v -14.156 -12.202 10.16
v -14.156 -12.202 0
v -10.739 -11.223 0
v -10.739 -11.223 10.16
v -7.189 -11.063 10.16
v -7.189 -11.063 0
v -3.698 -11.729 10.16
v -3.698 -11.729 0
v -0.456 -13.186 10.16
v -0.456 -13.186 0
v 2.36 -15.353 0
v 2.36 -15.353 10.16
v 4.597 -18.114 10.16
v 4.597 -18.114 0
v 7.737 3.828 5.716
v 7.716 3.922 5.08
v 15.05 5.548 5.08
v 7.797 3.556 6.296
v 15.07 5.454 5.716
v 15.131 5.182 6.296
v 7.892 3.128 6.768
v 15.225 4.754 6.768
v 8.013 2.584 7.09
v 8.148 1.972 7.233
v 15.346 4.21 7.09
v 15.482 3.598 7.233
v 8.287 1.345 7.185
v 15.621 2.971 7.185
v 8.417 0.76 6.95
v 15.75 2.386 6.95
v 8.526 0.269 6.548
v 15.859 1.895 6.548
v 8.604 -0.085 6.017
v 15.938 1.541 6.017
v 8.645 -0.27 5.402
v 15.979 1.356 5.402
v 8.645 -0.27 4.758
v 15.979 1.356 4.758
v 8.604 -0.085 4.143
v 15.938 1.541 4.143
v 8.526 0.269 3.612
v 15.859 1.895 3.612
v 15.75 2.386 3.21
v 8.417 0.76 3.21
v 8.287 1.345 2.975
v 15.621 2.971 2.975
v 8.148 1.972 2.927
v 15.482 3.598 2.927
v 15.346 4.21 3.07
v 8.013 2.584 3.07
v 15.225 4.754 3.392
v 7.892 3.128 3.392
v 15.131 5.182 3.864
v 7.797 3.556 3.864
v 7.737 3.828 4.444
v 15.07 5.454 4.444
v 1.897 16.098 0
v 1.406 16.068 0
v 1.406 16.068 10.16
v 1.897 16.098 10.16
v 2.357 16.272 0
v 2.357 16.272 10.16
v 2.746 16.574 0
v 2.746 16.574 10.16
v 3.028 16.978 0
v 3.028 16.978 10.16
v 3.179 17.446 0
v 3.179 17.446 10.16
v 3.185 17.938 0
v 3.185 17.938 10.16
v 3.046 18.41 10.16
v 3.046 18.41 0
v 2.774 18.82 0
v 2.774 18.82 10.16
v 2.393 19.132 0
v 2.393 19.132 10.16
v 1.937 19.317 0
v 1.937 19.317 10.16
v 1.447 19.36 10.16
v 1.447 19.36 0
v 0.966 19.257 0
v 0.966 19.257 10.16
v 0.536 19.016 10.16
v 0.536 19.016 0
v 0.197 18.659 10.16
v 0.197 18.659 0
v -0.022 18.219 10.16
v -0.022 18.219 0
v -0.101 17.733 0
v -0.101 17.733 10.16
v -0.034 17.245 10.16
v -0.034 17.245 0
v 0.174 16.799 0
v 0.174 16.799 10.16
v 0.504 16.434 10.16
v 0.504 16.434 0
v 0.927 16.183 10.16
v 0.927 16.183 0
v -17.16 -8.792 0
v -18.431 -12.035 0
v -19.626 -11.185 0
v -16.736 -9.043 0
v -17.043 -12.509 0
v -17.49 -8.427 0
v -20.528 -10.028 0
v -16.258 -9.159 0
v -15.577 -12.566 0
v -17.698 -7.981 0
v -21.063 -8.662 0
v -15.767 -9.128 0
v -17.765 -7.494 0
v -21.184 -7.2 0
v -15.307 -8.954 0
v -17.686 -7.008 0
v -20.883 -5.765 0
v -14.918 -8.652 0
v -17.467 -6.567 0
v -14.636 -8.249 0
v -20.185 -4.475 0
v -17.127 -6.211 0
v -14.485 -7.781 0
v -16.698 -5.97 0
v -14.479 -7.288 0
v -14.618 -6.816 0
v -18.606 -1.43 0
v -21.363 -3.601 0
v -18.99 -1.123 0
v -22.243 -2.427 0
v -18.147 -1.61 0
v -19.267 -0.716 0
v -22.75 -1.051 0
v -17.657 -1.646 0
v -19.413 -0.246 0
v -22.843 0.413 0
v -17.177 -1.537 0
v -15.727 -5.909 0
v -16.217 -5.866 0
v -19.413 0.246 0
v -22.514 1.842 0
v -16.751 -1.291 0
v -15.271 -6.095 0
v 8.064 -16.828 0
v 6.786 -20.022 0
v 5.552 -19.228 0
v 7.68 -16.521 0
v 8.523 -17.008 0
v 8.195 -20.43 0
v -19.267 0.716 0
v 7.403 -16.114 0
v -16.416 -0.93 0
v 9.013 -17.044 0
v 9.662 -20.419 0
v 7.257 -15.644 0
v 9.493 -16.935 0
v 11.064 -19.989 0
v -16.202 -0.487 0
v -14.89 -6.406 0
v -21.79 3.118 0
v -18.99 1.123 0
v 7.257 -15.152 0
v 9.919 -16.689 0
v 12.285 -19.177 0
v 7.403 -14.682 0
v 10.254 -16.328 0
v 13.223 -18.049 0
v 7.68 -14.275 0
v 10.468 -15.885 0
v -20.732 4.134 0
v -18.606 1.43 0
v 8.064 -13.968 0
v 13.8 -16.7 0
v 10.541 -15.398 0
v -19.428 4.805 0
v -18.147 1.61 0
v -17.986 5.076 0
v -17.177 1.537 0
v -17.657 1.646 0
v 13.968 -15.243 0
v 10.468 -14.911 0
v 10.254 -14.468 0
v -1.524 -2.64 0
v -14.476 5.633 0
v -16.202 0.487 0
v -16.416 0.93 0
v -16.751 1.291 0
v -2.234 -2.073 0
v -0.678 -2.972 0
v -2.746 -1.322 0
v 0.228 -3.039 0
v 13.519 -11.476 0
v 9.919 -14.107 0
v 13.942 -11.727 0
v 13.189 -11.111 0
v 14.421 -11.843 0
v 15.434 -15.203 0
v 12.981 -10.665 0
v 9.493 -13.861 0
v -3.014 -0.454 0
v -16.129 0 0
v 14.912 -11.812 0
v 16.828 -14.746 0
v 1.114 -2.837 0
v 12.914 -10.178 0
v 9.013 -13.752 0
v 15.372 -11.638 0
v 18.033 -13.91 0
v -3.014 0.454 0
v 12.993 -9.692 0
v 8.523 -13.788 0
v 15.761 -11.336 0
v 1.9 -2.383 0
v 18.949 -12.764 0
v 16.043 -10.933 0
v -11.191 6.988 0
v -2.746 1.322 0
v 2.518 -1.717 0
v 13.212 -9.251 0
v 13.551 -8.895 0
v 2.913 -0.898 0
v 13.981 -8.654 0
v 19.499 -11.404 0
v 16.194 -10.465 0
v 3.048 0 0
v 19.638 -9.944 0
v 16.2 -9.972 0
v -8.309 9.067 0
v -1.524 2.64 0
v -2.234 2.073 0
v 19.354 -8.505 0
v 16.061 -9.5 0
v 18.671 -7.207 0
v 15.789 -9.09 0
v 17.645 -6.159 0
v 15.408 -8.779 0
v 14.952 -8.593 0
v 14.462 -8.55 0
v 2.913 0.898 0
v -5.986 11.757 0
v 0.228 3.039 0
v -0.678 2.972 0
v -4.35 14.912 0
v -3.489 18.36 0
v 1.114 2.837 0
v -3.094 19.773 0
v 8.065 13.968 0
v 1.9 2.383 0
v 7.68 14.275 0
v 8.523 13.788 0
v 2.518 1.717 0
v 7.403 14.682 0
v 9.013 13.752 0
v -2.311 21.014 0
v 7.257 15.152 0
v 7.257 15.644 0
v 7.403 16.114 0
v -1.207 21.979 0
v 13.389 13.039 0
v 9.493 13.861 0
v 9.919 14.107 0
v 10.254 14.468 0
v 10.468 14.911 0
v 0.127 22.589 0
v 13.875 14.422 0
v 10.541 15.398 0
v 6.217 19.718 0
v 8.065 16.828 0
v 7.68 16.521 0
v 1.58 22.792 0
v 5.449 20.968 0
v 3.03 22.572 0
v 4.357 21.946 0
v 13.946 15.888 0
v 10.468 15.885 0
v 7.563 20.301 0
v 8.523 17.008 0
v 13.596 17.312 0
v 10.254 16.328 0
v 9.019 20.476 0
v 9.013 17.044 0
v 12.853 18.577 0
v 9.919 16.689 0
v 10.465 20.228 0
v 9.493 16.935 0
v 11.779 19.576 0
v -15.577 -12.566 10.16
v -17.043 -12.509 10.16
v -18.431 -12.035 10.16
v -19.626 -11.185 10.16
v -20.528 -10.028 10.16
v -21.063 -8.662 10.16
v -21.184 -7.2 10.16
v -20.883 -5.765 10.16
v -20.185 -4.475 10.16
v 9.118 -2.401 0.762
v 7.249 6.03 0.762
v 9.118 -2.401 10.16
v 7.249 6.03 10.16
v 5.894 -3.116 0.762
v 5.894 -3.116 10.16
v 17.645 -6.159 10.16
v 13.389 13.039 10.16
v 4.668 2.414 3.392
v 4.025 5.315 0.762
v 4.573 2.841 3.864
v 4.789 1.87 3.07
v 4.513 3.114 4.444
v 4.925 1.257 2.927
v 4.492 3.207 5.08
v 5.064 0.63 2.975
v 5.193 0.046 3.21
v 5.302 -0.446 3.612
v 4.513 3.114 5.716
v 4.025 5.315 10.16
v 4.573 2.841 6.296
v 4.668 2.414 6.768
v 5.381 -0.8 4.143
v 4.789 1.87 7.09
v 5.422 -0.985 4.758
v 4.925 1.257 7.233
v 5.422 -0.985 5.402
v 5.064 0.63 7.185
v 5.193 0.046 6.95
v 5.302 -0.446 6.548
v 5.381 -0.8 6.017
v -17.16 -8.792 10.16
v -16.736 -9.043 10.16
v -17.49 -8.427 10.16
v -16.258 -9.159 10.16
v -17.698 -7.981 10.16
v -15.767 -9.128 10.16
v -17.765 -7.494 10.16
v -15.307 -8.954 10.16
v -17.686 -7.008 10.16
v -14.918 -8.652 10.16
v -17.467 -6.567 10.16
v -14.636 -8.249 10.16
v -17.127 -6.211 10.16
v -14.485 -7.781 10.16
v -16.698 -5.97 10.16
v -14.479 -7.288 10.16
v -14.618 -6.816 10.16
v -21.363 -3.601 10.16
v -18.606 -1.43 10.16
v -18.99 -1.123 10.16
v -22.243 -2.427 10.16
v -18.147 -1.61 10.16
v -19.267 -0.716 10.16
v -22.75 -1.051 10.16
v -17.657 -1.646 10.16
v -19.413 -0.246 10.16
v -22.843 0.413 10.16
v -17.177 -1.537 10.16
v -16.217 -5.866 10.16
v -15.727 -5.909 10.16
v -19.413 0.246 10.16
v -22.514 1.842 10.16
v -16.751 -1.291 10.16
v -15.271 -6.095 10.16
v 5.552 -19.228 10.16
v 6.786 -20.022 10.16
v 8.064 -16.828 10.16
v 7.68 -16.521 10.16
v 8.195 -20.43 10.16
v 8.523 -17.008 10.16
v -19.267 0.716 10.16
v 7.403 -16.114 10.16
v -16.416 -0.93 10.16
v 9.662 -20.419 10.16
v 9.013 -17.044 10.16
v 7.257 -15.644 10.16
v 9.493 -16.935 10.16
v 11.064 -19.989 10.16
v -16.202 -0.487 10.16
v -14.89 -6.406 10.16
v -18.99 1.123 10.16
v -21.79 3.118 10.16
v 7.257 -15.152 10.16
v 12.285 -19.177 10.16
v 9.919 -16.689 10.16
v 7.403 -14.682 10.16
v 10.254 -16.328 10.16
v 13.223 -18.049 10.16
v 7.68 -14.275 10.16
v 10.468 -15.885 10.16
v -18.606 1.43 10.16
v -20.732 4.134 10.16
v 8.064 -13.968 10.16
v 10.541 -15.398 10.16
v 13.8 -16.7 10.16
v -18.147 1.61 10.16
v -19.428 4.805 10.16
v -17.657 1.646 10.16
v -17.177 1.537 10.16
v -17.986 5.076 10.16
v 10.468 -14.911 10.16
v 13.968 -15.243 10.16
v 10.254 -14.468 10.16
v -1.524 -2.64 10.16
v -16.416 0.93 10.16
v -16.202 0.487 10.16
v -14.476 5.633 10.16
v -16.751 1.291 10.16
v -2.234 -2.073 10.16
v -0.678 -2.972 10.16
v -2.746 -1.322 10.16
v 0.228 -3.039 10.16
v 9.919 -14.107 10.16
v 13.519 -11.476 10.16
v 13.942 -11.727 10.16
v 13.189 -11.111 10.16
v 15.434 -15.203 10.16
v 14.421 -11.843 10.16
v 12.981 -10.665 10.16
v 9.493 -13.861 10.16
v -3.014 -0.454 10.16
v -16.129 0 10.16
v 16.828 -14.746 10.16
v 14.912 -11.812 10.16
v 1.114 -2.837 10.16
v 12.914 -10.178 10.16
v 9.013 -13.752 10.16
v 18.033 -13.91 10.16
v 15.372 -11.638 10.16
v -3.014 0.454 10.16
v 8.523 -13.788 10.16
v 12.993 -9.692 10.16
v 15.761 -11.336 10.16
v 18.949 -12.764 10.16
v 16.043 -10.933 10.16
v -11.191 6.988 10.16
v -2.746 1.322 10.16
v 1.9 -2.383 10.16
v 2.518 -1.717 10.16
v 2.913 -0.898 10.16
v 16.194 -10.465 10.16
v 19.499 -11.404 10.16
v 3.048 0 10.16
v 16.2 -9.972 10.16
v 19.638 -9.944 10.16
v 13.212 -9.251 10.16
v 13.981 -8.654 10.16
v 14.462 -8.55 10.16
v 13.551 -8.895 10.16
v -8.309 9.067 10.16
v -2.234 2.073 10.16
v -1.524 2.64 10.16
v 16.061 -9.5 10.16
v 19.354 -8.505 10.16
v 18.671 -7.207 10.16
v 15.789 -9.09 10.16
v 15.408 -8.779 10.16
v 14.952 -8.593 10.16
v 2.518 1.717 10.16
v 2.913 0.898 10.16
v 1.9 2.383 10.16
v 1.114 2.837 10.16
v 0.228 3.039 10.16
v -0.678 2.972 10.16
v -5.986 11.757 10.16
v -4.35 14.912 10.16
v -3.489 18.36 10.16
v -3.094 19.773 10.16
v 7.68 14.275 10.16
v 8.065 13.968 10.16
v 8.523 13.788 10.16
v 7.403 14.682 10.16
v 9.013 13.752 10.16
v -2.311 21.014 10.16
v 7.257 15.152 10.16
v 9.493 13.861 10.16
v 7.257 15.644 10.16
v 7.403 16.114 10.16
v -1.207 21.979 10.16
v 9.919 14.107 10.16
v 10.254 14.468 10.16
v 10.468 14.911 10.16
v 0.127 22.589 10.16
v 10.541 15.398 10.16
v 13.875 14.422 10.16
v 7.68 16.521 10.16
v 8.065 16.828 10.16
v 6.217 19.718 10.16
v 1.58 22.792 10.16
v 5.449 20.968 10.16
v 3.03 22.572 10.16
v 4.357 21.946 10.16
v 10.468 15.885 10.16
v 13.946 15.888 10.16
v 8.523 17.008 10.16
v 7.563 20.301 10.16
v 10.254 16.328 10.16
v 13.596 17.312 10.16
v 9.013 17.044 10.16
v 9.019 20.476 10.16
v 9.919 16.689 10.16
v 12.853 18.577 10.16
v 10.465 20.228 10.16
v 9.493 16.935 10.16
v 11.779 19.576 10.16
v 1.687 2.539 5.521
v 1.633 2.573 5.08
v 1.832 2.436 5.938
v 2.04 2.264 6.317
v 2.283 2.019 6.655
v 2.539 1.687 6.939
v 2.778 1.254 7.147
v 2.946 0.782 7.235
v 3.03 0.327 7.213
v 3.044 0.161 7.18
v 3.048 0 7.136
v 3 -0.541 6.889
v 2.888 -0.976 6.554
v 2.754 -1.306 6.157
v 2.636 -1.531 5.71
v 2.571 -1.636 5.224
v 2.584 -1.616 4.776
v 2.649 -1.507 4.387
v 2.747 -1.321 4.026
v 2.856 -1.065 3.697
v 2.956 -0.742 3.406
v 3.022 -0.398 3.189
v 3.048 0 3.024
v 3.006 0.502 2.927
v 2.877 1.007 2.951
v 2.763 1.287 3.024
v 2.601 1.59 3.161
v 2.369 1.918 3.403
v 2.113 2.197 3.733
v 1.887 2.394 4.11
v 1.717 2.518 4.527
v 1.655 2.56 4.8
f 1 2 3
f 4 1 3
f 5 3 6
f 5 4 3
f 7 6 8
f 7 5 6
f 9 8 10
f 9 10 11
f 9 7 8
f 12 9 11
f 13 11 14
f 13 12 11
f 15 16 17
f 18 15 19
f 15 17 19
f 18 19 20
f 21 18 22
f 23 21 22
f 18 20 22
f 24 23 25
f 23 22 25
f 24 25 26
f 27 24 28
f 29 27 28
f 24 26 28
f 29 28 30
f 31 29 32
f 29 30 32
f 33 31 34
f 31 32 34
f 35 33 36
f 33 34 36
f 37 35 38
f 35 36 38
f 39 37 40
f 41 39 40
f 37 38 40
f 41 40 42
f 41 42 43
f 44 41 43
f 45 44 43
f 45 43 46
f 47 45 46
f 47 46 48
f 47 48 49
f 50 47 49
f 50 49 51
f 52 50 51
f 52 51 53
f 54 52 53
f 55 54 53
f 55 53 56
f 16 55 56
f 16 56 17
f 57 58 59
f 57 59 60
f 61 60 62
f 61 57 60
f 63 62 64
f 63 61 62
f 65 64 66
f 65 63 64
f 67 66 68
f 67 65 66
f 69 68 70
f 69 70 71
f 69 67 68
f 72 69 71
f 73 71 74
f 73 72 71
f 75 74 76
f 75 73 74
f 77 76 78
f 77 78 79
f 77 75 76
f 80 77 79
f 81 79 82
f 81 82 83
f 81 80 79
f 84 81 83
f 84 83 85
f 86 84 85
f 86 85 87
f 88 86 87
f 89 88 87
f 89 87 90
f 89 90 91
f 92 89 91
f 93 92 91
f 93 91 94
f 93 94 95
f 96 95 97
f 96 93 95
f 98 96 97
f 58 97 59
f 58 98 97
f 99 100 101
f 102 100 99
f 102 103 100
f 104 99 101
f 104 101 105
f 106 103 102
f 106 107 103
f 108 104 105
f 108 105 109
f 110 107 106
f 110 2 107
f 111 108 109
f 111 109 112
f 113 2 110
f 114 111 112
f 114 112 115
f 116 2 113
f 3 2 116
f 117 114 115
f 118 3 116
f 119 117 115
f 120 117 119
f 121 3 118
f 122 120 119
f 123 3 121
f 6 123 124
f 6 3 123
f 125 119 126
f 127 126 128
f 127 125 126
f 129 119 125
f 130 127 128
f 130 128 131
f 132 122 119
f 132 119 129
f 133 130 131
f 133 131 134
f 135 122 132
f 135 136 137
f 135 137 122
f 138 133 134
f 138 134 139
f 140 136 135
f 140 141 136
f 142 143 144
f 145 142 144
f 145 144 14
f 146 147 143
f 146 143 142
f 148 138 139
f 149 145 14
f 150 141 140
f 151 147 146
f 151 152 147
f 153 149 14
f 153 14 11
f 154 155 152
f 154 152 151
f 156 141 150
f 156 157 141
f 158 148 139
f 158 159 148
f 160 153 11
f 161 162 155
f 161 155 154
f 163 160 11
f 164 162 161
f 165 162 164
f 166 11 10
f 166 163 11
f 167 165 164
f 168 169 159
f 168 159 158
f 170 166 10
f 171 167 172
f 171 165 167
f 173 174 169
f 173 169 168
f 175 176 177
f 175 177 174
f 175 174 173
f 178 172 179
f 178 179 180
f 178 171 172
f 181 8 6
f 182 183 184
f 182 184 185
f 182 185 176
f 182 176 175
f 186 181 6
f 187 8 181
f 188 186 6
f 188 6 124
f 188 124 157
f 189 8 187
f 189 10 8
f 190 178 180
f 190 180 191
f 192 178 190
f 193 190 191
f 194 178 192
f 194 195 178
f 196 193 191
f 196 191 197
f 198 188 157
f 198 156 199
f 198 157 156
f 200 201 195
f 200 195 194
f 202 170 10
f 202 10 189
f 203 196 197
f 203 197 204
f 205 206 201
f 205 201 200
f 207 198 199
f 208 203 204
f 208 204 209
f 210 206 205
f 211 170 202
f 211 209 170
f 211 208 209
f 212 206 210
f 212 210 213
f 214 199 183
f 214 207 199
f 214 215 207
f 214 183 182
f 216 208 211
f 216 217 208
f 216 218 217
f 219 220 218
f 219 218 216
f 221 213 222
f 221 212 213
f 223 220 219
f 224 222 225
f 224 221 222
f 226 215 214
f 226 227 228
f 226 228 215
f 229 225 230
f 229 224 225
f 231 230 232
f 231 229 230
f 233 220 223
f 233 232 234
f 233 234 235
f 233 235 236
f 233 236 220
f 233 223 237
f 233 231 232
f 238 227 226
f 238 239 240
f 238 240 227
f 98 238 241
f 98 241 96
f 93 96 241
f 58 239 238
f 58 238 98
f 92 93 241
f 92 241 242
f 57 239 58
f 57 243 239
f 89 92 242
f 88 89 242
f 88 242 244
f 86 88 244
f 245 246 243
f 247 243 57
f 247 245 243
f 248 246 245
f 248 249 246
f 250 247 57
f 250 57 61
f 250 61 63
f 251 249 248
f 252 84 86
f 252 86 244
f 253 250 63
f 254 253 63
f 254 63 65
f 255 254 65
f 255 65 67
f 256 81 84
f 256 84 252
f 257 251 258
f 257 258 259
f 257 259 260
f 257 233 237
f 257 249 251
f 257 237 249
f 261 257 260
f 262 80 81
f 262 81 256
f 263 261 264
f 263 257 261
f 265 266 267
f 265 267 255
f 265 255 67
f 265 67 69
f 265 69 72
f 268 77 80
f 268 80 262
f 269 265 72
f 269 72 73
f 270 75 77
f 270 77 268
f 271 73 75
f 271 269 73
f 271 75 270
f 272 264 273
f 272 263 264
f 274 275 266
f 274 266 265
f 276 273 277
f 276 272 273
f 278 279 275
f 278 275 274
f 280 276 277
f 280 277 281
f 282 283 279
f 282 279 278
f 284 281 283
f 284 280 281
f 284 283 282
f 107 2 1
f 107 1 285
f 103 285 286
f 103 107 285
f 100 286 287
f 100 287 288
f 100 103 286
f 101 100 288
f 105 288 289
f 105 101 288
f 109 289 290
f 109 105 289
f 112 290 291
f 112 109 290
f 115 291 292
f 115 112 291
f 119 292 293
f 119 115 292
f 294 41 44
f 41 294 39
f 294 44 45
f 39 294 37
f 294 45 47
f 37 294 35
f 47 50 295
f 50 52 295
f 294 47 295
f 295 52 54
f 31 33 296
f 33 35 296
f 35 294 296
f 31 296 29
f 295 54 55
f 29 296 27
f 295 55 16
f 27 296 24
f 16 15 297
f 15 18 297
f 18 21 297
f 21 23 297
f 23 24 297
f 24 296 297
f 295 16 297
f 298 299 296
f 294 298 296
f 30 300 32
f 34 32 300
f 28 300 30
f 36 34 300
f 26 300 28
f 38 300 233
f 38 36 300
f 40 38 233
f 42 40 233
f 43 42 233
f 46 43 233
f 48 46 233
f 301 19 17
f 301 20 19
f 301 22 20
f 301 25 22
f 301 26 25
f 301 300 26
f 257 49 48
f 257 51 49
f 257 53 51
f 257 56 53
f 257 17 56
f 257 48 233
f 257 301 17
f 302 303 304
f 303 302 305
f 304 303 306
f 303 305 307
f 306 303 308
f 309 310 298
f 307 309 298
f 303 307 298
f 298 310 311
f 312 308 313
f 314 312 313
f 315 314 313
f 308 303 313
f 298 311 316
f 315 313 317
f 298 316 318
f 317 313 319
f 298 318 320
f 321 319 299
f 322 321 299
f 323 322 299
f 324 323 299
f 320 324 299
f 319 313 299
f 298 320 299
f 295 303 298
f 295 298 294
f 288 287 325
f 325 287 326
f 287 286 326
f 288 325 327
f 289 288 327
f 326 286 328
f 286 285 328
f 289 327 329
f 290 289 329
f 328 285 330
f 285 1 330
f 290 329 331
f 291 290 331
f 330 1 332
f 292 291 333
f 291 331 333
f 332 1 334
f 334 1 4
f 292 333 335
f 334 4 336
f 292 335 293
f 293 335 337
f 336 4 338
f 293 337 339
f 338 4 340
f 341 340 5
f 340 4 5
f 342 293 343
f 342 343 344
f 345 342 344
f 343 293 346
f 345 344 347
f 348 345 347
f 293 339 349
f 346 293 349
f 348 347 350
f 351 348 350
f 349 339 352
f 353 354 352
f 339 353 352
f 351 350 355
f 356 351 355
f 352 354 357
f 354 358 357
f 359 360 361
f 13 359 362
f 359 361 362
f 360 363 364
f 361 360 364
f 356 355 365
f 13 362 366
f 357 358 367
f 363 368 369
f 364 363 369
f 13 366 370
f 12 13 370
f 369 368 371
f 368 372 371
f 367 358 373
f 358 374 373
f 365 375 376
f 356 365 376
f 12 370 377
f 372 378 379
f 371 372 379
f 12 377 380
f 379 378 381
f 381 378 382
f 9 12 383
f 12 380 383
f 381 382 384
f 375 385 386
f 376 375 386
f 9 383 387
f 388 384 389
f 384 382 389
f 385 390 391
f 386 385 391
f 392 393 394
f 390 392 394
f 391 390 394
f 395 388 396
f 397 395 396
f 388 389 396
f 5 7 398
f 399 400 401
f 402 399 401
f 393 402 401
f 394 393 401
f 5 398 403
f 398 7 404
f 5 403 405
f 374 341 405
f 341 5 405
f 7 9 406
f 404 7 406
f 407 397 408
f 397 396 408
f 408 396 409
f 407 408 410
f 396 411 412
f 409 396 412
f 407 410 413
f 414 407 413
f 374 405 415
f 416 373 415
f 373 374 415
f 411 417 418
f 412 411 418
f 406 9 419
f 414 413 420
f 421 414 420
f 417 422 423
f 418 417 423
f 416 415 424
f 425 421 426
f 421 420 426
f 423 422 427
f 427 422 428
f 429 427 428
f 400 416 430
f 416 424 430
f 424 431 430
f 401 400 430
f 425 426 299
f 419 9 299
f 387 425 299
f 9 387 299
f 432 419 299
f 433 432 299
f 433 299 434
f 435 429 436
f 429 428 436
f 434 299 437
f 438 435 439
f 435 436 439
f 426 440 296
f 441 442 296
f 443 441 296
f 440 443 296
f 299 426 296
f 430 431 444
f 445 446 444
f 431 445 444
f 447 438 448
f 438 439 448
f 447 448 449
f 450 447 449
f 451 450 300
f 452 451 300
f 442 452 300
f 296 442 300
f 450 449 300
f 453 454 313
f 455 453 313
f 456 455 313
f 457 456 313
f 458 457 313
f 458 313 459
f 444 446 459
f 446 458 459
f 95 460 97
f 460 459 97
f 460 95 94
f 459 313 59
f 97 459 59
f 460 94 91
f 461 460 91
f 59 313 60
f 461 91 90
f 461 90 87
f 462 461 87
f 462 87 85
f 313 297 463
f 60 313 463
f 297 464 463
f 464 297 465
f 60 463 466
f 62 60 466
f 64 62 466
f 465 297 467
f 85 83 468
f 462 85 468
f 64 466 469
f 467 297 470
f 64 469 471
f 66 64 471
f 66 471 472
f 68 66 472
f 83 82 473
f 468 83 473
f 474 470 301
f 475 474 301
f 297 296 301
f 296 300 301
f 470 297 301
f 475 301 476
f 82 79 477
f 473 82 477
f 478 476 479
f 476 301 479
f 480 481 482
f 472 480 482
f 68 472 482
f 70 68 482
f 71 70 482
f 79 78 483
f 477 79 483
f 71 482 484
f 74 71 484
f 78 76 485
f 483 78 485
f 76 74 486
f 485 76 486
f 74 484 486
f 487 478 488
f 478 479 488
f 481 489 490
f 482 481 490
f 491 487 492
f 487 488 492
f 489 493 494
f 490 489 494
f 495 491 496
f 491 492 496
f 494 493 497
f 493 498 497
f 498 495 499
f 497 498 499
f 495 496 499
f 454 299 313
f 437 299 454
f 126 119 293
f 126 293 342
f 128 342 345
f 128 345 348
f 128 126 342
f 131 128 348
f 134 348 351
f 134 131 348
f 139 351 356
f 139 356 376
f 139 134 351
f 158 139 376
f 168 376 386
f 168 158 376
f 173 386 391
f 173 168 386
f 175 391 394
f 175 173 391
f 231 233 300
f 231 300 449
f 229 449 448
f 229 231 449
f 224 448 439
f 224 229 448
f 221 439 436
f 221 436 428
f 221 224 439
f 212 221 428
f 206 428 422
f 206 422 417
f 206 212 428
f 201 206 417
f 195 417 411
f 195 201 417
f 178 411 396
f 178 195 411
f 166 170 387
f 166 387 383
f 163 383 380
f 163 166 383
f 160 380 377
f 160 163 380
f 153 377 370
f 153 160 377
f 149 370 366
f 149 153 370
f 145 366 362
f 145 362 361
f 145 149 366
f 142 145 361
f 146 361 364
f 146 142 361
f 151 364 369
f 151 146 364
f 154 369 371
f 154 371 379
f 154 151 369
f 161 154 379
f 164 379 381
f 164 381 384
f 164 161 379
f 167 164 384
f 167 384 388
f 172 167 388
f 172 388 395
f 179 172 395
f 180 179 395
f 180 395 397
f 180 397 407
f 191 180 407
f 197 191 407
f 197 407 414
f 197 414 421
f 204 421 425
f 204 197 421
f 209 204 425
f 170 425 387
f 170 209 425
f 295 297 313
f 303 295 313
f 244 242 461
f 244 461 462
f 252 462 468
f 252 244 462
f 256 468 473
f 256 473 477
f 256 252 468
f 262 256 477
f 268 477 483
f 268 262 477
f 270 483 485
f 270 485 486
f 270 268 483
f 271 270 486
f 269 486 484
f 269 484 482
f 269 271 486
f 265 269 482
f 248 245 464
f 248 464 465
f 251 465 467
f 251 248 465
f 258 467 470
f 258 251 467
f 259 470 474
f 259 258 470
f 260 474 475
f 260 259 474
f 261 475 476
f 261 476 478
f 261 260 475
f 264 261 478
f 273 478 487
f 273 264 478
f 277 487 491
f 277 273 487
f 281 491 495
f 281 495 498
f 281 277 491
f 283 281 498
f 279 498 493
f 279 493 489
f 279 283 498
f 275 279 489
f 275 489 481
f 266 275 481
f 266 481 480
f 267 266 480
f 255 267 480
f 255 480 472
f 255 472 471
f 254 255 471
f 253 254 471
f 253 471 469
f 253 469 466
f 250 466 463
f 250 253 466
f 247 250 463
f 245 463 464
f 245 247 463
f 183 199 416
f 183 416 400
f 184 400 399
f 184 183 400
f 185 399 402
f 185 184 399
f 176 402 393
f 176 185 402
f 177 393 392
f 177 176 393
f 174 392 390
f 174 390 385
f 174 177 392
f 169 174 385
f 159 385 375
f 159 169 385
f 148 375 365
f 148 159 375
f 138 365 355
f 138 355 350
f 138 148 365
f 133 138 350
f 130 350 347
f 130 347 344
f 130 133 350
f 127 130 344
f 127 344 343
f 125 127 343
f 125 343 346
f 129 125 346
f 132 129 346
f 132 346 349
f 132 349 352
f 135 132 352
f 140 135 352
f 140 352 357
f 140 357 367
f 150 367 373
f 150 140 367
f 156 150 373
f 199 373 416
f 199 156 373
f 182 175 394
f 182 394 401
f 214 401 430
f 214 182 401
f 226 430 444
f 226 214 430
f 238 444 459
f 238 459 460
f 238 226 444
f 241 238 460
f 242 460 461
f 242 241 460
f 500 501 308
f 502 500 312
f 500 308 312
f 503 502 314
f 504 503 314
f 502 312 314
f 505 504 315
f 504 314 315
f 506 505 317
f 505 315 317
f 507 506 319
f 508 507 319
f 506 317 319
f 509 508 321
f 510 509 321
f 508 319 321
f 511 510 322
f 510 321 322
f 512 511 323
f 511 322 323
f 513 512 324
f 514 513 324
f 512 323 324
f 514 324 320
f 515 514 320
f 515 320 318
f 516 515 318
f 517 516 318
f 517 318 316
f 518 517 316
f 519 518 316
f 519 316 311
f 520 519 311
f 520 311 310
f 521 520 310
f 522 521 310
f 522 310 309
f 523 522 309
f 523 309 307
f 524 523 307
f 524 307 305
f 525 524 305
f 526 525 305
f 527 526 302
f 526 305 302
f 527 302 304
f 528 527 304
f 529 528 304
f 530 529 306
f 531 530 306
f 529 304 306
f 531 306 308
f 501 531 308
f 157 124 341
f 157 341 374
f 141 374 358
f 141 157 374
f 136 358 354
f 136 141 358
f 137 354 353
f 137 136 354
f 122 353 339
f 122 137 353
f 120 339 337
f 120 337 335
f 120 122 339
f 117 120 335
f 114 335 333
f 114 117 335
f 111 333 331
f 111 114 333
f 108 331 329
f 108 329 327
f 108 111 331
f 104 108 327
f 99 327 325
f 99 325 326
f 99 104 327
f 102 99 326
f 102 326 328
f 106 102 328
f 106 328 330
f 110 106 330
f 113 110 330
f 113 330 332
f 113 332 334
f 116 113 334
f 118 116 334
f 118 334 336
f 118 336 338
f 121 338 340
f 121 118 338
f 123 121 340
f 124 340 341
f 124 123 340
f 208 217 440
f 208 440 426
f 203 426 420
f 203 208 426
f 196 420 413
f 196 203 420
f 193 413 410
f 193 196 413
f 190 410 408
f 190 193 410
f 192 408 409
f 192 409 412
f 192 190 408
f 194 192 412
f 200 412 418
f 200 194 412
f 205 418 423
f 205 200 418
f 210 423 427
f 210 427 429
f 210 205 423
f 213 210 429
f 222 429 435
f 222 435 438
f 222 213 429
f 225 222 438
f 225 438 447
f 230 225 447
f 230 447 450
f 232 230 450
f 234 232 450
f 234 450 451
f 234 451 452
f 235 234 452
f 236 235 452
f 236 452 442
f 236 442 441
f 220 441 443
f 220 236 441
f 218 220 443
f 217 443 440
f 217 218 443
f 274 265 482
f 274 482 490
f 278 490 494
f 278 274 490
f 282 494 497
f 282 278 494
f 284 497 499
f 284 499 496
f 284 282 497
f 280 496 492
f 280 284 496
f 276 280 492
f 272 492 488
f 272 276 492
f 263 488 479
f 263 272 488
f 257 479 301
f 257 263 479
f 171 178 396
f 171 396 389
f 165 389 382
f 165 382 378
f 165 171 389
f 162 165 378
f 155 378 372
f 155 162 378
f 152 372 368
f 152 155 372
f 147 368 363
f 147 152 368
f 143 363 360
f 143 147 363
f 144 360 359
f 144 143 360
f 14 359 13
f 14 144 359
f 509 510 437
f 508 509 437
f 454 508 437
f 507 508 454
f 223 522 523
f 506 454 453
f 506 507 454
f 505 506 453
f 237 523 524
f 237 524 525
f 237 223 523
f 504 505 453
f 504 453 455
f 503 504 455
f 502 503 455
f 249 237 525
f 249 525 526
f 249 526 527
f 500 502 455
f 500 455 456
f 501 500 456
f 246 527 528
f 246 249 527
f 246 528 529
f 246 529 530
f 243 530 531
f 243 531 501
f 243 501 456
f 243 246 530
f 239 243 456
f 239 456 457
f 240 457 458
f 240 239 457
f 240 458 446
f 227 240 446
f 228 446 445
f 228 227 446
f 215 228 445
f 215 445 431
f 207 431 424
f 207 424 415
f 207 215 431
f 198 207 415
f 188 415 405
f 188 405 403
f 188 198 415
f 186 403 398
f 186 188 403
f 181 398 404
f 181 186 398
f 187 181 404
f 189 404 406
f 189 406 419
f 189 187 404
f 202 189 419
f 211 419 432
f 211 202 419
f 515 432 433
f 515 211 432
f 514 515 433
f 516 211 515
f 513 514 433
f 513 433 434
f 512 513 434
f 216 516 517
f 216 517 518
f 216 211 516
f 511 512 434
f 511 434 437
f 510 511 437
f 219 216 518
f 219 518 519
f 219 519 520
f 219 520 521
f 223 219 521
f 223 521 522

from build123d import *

# Parameters (mm, degrees)
SKETCH1_R                     = 3.048
SKETCH1_R_2                   = 1.651
BOSS_EXTRUDE1_DEPTH           = 10.16
CIRPATTERN1_COUNT             = 2
CIRPATTERN1_ANGLE             = 25
CIRPATTERN2_COUNT             = 3
CIRPATTERN2_COPY_1_SKETCH_R   = 3.048
CIRPATTERN2_COPY_1_SKETCH_R_2 = 1.651
CIRPATTERN2_COPY_1_DEPTH      = 10.16
CIRPATTERN2_COPY_2_SKETCH_R   = 3.048
CIRPATTERN2_COPY_2_SKETCH_R_2 = 1.651
CIRPATTERN2_COPY_2_DEPTH      = 10.16
FILLET1_R                     = 15.24
CUT_EXTRUDE1_DEPTH            = 9.398
BOSS_EXTRUDE3_REACH           = 49.452
SKETCH7_W                     = 10.16
SKETCH7_H                     = 19.663186572
CUT_EXTRUDE3_START            = -1.198457
SKETCH8_W                     = 10.16
SKETCH8_H                     = 19.663186572
CUT_EXTRUDE3_DEPTH            = 1.198457
CUT_EXTRUDE2_REACH            = 49.452
CUT_EXTRUDE2_END_RADIUS       = 3.048
SKETCH5_R                     = 2.159


with BuildPart() as part:
    # Sketch1 → Boss-Extrude1 (new body)
    with BuildSketch(Plane.XY):
        with BuildLine():
            Line((-17.78, 5.08), (0, 5.08))
            ThreePointArc((0, 5.08), (5.08, 0), (0, -5.08))
            Line((0, -5.08), (-17.78, -5.08))
            ThreePointArc((-17.78, -5.08), (-22.86, 0), (-17.78, 5.08))
        make_face()
        Circle(SKETCH1_R, mode=Mode.SUBTRACT)
        with Locations((-17.78, 0)):
            Circle(SKETCH1_R_2, mode=Mode.SUBTRACT)
    boss_extrude1 = extrude(amount=BOSS_EXTRUDE1_DEPTH)

    # CirPattern1: Boss-Extrude1 ×2 about axis
    cirpattern1_axis = Axis((0, 0, 10.16), (0, 0, 1))
    for i in range(1, CIRPATTERN1_COUNT):
        add(boss_extrude1.rotate(cirpattern1_axis, i * CIRPATTERN1_ANGLE / (CIRPATTERN1_COUNT - 1)))

    # CirPattern2: Boss-Extrude1 ×3 about axis
    cirpattern2_axis = Axis((0, 0, 0), (0, 0, 1))
    for i in range(1, CIRPATTERN2_COUNT):
        add(boss_extrude1.rotate(cirpattern2_axis, i * 360 / CIRPATTERN2_COUNT))

    # CirPattern2 copy 1 sketch → CirPattern2 copy 1 (add)
    with BuildSketch(Plane(origin=(0, 0, 0), x_dir=(-0.8191520442889921, 0.5735764363510454, 0), z_dir=(0, 0, 1))):
        with BuildLine():
            Line((-17.78, 5.08), (0, 5.08))
            ThreePointArc((0, 5.08), (5.08, 0), (0, -5.08))
            Line((0, -5.08), (-17.78, -5.08))
            ThreePointArc((-17.78, -5.08), (-22.86, 0), (-17.78, 5.08))
        make_face()
        Circle(CIRPATTERN2_COPY_1_SKETCH_R, mode=Mode.SUBTRACT)
        with Locations((-17.78, 0)):
            Circle(CIRPATTERN2_COPY_1_SKETCH_R_2, mode=Mode.SUBTRACT)
    extrude(amount=CIRPATTERN2_COPY_1_DEPTH)

    # CirPattern2 copy 2 sketch → CirPattern2 copy 2 (add)
    with BuildSketch(Plane(origin=(0, 0, 0), x_dir=(-0.0871557427476577, -0.9961946980917455, 0), z_dir=(0, 0, 1))):
        with BuildLine():
            Line((-17.78, 5.08), (0, 5.08))
            ThreePointArc((0, 5.08), (5.08, 0), (0, -5.08))
            Line((0, -5.08), (-17.78, -5.08))
            ThreePointArc((-17.78, -5.08), (-22.86, 0), (-17.78, 5.08))
        make_face()
        Circle(CIRPATTERN2_COPY_2_SKETCH_R, mode=Mode.SUBTRACT)
        with Locations((-17.78, 0)):
            Circle(CIRPATTERN2_COPY_2_SKETCH_R_2, mode=Mode.SUBTRACT)
    extrude(amount=CIRPATTERN2_COPY_2_DEPTH)

    # Fillet1
    # the kernel refuses this fillet: 15.24 mm, written as the material it adds along each edge
    with BuildSketch(Plane(origin=(-4.654962364, 5.08, 0), x_dir=(0.0874683738412008, 0.9961672969825781, 0), z_dir=(0, 0, 1)), Plane(origin=(6.726890233, 1.491315661, 0), x_dir=(0.81897199868559, -0.5738334822654828, 0), z_dir=(0, 0, 1))) as fillet1_piece_1:
        with BuildLine():
            CenterArc((13.944774221, 15.227642174), FILLET1_R, 187.343482599, 80.348997025)
            Line((-1.17022312, 13.279705988), (-2.681722854, 13.084912369))
            ThreePointArc((-2.681722854, 13.084912369), (-2.666184659, 12.941431463), (-1.518158961, -0.133301802))
            Line((-1.518158961, -0.133301802), (0.000478276, -1.523999925))
            ThreePointArc((0.000478276, -1.523999925), (13.125515266, -1.5198809), (13.269806265, -1.522764217))
            Line((13.269806265, -1.522764217), (13.331166988, 0))
        make_face()
    extrude(amount=10.16)
    with BuildSketch(Plane(origin=(-2.071927869, -6.571315661, 10.16), x_dir=(-0.9064403725267903, -0.4223338147170952, 0), z_dir=(0, 0, -1))) as fillet1_piece_2:
        with BuildLine():
            CenterArc((13.944774221, -15.227642174), FILLET1_R, 92.307520375, 80.348997025)
            Line((-1.17022312, -13.279705988), (-2.681722854, -13.084912369))
            ThreePointArc((-2.681722854, -13.084912369), (-2.666184659, -12.941431463), (-1.518158961, 0.133301802))
            Line((-1.518158961, 0.133301802), (0.000478276, 1.523999925))
            ThreePointArc((0.000478276, 1.523999925), (13.125515266, 1.5198809), (13.269806265, 1.522764217))
            Line((13.269806265, 1.522764217), (13.331166988, 0))
        make_face()
    extrude(amount=10.16)

    # Sketch4 → Cut-Extrude1 (cut)
    with BuildSketch(Plane.XY.offset(10.16)):
        Polygon((4.024997463, 5.315159398), (5.894169969, -3.11613292), (9.117899385, -2.401449315), (7.248726879, 6.029843003), align=None)
    extrude(amount=-CUT_EXTRUDE1_DEPTH, mode=Mode.SUBTRACT)

    # Sketch7 → Boss-Extrude3 (add, up to next)
    with BuildSketch(Plane(origin=(16.68684539, 3.699384559, 0), x_dir=(0, 0, -1), z_dir=(0.9762960071199317, 0.21643961393811023, 0)), mode=Mode.PRIVATE) as boss_extrude3_sk1:
        with Locations((-5.08, 0)):
            Rectangle(SKETCH7_W, SKETCH7_H)
    boss_extrude3_tool1 = extrude(boss_extrude3_sk1.sketch, amount=-BOSS_EXTRUDE3_REACH, mode=Mode.PRIVATE) - part.part
    add(boss_extrude3_tool1.solids().sort_by_distance((16.686845, 3.699385, 5.08))[0])

    # Sketch8 → Cut-Extrude3 (cut)
    with BuildSketch(Plane(origin=(16.68684539, 3.699384559, 0), x_dir=(0, 0, -1), z_dir=(0.9762960071199318, 0.2164396139381102, 0)).offset(CUT_EXTRUDE3_START)):
        with Locations((-5.08, 0)):
            Rectangle(SKETCH8_W, SKETCH8_H)
    extrude(amount=CUT_EXTRUDE3_DEPTH, mode=Mode.SUBTRACT)

    # Cut-Extrude2: up to this cylinder (the profile starts outside it)
    cut_extrude2_end = Plane(origin=(0, 0, 5.08), z_dir=(0, 0, -1)) * Cylinder(CUT_EXTRUDE2_END_RADIUS, 106, mode=Mode.PRIVATE)
    # Sketch5 → Cut-Extrude2 (cut, up to the surface)
    with BuildSketch(Plane(origin=(16.68684539, 3.699384559, 0), x_dir=(0, 0, -1), z_dir=(0.9762960071199317, 0.21643961393811023, 0)), mode=Mode.PRIVATE) as cut_extrude2_sk1:
        with Locations(Location((-5.08, 0, 0), (0, 0, 90))):
            Circle(SKETCH5_R)
    cut_extrude2_tool1 = extrude(cut_extrude2_sk1.sketch, amount=-CUT_EXTRUDE2_REACH, mode=Mode.PRIVATE) - cut_extrude2_end
    add(cut_extrude2_tool1.solids().sort_by_distance((16.686845, 3.699385, 5.08))[0], mode=Mode.SUBTRACT)


solid = part.part
